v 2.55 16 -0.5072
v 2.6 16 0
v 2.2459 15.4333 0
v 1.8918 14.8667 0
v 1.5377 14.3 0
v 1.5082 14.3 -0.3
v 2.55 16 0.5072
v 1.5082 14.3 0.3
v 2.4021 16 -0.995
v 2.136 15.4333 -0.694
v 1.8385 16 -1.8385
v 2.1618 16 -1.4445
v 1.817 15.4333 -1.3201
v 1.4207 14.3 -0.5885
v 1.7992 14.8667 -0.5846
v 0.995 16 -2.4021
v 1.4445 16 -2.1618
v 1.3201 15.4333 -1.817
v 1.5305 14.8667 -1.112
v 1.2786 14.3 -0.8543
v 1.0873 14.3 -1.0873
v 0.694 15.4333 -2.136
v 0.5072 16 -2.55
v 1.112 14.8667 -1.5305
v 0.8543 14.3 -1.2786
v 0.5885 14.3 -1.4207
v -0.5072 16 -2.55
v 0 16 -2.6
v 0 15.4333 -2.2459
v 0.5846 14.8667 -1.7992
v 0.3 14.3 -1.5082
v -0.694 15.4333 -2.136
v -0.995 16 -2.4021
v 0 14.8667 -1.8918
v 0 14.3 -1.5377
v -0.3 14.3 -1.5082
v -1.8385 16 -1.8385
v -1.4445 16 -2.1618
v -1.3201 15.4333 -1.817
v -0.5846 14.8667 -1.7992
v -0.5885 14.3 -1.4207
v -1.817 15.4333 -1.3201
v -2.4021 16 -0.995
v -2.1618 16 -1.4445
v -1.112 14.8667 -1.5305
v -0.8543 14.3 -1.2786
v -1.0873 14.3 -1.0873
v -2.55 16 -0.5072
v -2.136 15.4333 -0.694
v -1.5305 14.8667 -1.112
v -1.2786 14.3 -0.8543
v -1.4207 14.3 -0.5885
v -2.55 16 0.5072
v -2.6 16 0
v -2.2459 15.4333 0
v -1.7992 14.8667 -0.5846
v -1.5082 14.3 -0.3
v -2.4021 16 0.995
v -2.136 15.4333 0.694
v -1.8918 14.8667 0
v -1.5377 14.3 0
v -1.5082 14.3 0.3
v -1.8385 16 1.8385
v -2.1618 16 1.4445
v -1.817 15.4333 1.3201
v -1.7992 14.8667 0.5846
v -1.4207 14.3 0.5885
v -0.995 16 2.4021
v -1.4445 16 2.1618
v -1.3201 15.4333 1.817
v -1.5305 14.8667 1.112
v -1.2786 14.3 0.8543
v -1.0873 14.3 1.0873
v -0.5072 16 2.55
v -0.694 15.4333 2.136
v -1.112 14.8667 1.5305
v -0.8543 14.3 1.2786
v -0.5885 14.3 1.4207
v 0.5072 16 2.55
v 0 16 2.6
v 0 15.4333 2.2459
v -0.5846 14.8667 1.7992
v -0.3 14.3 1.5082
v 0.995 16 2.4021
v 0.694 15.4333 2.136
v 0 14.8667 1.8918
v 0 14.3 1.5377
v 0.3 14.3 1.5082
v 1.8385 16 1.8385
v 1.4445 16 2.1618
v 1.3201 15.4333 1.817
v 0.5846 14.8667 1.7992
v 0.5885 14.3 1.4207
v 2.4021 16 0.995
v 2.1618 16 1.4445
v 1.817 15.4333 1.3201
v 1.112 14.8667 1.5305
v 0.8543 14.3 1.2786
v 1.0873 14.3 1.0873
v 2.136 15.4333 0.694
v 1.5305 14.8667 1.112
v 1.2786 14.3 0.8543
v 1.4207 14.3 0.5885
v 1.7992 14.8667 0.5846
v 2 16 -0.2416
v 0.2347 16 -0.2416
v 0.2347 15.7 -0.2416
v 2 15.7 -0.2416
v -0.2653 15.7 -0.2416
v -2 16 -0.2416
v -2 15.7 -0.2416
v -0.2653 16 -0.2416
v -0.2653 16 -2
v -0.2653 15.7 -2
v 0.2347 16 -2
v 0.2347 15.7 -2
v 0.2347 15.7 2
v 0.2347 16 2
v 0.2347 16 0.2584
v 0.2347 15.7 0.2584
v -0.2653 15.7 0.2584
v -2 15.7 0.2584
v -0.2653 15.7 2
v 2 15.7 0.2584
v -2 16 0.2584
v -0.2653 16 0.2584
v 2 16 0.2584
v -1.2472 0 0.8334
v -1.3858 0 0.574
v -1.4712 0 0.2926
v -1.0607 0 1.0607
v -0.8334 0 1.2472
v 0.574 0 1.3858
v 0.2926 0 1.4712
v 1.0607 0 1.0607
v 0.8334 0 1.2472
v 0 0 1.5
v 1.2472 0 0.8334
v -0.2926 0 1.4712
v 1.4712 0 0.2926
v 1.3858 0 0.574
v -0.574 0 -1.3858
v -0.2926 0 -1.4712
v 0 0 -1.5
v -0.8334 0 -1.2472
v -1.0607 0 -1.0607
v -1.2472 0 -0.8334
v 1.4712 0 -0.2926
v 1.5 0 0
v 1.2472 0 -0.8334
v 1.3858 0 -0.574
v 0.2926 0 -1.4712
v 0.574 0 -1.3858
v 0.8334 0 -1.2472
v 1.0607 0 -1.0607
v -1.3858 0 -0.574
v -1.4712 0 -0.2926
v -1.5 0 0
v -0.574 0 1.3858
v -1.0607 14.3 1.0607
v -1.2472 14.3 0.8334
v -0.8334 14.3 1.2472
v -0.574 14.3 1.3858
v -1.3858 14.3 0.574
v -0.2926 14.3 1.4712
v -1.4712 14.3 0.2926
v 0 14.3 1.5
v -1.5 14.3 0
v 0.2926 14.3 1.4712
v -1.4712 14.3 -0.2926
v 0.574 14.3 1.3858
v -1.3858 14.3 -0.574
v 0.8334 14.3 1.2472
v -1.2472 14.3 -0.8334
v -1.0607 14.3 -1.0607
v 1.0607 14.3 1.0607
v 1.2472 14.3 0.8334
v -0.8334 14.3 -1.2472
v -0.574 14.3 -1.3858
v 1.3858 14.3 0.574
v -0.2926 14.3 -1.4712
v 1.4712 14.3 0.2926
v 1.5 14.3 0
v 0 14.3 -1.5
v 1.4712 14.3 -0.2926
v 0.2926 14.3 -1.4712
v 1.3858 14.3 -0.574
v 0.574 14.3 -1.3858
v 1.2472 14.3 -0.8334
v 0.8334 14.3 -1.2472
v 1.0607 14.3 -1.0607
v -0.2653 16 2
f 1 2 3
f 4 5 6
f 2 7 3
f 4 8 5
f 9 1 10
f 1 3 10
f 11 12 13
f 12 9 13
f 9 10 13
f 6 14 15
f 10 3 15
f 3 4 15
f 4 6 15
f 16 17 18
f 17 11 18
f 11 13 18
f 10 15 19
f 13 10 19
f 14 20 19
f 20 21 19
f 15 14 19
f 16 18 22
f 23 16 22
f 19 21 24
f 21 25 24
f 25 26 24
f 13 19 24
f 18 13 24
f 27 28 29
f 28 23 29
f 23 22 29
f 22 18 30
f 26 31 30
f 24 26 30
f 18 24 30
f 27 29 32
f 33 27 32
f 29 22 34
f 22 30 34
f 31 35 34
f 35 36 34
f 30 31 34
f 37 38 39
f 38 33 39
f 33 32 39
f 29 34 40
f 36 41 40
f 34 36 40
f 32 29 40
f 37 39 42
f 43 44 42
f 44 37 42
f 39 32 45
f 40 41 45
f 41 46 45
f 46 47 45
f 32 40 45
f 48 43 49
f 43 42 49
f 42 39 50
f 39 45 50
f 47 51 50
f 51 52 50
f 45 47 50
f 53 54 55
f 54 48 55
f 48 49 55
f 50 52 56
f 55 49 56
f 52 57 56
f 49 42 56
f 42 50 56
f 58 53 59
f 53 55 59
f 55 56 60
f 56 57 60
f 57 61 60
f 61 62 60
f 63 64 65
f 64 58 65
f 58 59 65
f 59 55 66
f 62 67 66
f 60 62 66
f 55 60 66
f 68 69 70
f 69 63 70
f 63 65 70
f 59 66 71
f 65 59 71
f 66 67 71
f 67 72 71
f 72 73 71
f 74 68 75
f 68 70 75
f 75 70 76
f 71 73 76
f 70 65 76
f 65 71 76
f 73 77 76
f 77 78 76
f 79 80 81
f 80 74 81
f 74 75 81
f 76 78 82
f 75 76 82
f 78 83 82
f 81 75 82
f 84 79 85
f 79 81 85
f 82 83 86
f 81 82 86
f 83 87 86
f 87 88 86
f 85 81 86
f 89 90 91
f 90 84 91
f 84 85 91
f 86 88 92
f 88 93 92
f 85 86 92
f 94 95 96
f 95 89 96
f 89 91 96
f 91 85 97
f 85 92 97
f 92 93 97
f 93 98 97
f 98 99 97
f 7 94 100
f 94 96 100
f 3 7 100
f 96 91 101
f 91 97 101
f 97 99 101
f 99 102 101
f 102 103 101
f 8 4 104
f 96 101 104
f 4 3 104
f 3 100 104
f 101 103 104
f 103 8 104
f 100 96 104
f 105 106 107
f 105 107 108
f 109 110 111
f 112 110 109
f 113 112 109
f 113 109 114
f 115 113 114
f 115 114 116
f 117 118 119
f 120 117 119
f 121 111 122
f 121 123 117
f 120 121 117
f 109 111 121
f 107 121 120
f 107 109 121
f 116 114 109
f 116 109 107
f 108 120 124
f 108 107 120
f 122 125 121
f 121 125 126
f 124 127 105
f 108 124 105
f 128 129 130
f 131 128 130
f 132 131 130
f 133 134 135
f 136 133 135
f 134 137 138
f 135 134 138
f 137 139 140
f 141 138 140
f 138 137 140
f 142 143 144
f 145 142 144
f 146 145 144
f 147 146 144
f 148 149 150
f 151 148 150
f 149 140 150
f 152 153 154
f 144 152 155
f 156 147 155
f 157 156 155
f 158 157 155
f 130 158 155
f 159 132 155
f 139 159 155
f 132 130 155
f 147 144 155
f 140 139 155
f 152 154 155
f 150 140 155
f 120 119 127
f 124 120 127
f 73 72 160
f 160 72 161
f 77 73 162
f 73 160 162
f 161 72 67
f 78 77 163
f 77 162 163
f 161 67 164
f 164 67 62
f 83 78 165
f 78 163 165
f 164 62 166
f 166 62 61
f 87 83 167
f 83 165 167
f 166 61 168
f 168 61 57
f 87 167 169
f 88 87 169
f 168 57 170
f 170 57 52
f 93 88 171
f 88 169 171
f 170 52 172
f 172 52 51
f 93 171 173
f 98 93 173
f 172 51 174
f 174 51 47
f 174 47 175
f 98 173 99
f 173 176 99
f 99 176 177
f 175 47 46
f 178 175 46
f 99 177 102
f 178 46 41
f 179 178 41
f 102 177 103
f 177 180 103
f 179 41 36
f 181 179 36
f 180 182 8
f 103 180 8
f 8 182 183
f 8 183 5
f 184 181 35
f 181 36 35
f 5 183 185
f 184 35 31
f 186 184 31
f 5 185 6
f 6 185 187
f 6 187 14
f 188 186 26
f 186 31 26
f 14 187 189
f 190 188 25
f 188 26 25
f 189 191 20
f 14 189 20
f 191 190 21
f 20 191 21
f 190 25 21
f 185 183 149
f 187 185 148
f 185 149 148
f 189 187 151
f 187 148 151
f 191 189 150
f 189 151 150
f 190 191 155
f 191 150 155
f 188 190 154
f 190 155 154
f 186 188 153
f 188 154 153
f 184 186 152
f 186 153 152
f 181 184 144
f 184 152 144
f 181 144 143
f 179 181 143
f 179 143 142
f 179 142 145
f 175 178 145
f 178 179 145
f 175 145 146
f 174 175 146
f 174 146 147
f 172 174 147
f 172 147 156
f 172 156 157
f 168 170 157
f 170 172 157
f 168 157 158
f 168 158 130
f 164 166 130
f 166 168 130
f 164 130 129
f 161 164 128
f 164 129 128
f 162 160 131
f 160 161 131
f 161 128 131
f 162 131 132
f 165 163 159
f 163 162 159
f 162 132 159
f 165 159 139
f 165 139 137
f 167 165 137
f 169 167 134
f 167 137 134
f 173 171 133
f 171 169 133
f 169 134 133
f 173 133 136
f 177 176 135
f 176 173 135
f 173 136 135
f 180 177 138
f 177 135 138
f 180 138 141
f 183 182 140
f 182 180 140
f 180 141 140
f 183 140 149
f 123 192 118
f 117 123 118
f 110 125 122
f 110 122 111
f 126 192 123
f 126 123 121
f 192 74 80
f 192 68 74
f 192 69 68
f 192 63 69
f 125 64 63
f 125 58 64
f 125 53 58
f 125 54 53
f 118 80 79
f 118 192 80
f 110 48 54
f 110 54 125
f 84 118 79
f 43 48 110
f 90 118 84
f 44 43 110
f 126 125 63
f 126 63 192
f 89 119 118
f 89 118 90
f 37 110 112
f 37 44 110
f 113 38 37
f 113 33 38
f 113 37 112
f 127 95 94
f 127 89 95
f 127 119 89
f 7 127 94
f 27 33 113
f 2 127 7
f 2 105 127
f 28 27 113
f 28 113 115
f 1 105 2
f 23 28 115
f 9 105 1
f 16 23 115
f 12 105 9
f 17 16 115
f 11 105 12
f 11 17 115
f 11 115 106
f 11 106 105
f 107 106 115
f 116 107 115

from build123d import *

# Parameters (mm, degrees)
SKETCH1_R           = 1.5
BOSS_EXTRUDE1_DEPTH = 16
SKETCH2_R           = 2.6
BOSS_EXTRUDE2_DEPTH = 1.7
BOSS_EXTRUDE2_TAPER = 32
SKETCH3_W           = 0.5
SKETCH3_H           = 1.758378485
SKETCH3_H_2         = 1.741621515
SKETCH3_W_2         = 1.734727157
SKETCH3_H_3         = 0.5
SKETCH3_W_3         = 1.765272843
CUT_EXTRUDE1_DEPTH  = 0.3


with BuildPart() as part:
    # Sketch1 → Boss-Extrude1 (new body)
    with BuildSketch(Plane(origin=(0, 0, 0), x_dir=(1, 0, 0), z_dir=(0, 1, 0))):
        Circle(SKETCH1_R)
    extrude(amount=BOSS_EXTRUDE1_DEPTH)

    # Sketch2 → Boss-Extrude2 (add)
    with BuildSketch(Plane(origin=(0, 16, 0), x_dir=(1, 0, 0), z_dir=(0, 1, 0))):
        Circle(SKETCH2_R)
    extrude(amount=-BOSS_EXTRUDE2_DEPTH, taper=BOSS_EXTRUDE2_TAPER)

    # Sketch3 → Cut-Extrude1 (cut)
    with BuildSketch(Plane(origin=(0, 16, 0), x_dir=(1, 0, 0), z_dir=(0, 1, 0))):
        with Locations((-0.015272843, 1.120810757)):
            Rectangle(SKETCH3_W, SKETCH3_H)
        with Locations((-0.015272843, -1.129189243)):
            Rectangle(SKETCH3_W, SKETCH3_H_2)
        with Locations((-1.132636421, -0.008378485)):
            Rectangle(SKETCH3_W_2, SKETCH3_H_3)
        with Locations((1.117363579, -0.008378485)):
            Rectangle(SKETCH3_W_3, SKETCH3_H_3)
        with Locations((-0.015272843, -0.008378485)):
            Rectangle(SKETCH3_W, SKETCH3_H_3)
    extrude(amount=-CUT_EXTRUDE1_DEPTH, mode=Mode.SUBTRACT)


solid = part.part
